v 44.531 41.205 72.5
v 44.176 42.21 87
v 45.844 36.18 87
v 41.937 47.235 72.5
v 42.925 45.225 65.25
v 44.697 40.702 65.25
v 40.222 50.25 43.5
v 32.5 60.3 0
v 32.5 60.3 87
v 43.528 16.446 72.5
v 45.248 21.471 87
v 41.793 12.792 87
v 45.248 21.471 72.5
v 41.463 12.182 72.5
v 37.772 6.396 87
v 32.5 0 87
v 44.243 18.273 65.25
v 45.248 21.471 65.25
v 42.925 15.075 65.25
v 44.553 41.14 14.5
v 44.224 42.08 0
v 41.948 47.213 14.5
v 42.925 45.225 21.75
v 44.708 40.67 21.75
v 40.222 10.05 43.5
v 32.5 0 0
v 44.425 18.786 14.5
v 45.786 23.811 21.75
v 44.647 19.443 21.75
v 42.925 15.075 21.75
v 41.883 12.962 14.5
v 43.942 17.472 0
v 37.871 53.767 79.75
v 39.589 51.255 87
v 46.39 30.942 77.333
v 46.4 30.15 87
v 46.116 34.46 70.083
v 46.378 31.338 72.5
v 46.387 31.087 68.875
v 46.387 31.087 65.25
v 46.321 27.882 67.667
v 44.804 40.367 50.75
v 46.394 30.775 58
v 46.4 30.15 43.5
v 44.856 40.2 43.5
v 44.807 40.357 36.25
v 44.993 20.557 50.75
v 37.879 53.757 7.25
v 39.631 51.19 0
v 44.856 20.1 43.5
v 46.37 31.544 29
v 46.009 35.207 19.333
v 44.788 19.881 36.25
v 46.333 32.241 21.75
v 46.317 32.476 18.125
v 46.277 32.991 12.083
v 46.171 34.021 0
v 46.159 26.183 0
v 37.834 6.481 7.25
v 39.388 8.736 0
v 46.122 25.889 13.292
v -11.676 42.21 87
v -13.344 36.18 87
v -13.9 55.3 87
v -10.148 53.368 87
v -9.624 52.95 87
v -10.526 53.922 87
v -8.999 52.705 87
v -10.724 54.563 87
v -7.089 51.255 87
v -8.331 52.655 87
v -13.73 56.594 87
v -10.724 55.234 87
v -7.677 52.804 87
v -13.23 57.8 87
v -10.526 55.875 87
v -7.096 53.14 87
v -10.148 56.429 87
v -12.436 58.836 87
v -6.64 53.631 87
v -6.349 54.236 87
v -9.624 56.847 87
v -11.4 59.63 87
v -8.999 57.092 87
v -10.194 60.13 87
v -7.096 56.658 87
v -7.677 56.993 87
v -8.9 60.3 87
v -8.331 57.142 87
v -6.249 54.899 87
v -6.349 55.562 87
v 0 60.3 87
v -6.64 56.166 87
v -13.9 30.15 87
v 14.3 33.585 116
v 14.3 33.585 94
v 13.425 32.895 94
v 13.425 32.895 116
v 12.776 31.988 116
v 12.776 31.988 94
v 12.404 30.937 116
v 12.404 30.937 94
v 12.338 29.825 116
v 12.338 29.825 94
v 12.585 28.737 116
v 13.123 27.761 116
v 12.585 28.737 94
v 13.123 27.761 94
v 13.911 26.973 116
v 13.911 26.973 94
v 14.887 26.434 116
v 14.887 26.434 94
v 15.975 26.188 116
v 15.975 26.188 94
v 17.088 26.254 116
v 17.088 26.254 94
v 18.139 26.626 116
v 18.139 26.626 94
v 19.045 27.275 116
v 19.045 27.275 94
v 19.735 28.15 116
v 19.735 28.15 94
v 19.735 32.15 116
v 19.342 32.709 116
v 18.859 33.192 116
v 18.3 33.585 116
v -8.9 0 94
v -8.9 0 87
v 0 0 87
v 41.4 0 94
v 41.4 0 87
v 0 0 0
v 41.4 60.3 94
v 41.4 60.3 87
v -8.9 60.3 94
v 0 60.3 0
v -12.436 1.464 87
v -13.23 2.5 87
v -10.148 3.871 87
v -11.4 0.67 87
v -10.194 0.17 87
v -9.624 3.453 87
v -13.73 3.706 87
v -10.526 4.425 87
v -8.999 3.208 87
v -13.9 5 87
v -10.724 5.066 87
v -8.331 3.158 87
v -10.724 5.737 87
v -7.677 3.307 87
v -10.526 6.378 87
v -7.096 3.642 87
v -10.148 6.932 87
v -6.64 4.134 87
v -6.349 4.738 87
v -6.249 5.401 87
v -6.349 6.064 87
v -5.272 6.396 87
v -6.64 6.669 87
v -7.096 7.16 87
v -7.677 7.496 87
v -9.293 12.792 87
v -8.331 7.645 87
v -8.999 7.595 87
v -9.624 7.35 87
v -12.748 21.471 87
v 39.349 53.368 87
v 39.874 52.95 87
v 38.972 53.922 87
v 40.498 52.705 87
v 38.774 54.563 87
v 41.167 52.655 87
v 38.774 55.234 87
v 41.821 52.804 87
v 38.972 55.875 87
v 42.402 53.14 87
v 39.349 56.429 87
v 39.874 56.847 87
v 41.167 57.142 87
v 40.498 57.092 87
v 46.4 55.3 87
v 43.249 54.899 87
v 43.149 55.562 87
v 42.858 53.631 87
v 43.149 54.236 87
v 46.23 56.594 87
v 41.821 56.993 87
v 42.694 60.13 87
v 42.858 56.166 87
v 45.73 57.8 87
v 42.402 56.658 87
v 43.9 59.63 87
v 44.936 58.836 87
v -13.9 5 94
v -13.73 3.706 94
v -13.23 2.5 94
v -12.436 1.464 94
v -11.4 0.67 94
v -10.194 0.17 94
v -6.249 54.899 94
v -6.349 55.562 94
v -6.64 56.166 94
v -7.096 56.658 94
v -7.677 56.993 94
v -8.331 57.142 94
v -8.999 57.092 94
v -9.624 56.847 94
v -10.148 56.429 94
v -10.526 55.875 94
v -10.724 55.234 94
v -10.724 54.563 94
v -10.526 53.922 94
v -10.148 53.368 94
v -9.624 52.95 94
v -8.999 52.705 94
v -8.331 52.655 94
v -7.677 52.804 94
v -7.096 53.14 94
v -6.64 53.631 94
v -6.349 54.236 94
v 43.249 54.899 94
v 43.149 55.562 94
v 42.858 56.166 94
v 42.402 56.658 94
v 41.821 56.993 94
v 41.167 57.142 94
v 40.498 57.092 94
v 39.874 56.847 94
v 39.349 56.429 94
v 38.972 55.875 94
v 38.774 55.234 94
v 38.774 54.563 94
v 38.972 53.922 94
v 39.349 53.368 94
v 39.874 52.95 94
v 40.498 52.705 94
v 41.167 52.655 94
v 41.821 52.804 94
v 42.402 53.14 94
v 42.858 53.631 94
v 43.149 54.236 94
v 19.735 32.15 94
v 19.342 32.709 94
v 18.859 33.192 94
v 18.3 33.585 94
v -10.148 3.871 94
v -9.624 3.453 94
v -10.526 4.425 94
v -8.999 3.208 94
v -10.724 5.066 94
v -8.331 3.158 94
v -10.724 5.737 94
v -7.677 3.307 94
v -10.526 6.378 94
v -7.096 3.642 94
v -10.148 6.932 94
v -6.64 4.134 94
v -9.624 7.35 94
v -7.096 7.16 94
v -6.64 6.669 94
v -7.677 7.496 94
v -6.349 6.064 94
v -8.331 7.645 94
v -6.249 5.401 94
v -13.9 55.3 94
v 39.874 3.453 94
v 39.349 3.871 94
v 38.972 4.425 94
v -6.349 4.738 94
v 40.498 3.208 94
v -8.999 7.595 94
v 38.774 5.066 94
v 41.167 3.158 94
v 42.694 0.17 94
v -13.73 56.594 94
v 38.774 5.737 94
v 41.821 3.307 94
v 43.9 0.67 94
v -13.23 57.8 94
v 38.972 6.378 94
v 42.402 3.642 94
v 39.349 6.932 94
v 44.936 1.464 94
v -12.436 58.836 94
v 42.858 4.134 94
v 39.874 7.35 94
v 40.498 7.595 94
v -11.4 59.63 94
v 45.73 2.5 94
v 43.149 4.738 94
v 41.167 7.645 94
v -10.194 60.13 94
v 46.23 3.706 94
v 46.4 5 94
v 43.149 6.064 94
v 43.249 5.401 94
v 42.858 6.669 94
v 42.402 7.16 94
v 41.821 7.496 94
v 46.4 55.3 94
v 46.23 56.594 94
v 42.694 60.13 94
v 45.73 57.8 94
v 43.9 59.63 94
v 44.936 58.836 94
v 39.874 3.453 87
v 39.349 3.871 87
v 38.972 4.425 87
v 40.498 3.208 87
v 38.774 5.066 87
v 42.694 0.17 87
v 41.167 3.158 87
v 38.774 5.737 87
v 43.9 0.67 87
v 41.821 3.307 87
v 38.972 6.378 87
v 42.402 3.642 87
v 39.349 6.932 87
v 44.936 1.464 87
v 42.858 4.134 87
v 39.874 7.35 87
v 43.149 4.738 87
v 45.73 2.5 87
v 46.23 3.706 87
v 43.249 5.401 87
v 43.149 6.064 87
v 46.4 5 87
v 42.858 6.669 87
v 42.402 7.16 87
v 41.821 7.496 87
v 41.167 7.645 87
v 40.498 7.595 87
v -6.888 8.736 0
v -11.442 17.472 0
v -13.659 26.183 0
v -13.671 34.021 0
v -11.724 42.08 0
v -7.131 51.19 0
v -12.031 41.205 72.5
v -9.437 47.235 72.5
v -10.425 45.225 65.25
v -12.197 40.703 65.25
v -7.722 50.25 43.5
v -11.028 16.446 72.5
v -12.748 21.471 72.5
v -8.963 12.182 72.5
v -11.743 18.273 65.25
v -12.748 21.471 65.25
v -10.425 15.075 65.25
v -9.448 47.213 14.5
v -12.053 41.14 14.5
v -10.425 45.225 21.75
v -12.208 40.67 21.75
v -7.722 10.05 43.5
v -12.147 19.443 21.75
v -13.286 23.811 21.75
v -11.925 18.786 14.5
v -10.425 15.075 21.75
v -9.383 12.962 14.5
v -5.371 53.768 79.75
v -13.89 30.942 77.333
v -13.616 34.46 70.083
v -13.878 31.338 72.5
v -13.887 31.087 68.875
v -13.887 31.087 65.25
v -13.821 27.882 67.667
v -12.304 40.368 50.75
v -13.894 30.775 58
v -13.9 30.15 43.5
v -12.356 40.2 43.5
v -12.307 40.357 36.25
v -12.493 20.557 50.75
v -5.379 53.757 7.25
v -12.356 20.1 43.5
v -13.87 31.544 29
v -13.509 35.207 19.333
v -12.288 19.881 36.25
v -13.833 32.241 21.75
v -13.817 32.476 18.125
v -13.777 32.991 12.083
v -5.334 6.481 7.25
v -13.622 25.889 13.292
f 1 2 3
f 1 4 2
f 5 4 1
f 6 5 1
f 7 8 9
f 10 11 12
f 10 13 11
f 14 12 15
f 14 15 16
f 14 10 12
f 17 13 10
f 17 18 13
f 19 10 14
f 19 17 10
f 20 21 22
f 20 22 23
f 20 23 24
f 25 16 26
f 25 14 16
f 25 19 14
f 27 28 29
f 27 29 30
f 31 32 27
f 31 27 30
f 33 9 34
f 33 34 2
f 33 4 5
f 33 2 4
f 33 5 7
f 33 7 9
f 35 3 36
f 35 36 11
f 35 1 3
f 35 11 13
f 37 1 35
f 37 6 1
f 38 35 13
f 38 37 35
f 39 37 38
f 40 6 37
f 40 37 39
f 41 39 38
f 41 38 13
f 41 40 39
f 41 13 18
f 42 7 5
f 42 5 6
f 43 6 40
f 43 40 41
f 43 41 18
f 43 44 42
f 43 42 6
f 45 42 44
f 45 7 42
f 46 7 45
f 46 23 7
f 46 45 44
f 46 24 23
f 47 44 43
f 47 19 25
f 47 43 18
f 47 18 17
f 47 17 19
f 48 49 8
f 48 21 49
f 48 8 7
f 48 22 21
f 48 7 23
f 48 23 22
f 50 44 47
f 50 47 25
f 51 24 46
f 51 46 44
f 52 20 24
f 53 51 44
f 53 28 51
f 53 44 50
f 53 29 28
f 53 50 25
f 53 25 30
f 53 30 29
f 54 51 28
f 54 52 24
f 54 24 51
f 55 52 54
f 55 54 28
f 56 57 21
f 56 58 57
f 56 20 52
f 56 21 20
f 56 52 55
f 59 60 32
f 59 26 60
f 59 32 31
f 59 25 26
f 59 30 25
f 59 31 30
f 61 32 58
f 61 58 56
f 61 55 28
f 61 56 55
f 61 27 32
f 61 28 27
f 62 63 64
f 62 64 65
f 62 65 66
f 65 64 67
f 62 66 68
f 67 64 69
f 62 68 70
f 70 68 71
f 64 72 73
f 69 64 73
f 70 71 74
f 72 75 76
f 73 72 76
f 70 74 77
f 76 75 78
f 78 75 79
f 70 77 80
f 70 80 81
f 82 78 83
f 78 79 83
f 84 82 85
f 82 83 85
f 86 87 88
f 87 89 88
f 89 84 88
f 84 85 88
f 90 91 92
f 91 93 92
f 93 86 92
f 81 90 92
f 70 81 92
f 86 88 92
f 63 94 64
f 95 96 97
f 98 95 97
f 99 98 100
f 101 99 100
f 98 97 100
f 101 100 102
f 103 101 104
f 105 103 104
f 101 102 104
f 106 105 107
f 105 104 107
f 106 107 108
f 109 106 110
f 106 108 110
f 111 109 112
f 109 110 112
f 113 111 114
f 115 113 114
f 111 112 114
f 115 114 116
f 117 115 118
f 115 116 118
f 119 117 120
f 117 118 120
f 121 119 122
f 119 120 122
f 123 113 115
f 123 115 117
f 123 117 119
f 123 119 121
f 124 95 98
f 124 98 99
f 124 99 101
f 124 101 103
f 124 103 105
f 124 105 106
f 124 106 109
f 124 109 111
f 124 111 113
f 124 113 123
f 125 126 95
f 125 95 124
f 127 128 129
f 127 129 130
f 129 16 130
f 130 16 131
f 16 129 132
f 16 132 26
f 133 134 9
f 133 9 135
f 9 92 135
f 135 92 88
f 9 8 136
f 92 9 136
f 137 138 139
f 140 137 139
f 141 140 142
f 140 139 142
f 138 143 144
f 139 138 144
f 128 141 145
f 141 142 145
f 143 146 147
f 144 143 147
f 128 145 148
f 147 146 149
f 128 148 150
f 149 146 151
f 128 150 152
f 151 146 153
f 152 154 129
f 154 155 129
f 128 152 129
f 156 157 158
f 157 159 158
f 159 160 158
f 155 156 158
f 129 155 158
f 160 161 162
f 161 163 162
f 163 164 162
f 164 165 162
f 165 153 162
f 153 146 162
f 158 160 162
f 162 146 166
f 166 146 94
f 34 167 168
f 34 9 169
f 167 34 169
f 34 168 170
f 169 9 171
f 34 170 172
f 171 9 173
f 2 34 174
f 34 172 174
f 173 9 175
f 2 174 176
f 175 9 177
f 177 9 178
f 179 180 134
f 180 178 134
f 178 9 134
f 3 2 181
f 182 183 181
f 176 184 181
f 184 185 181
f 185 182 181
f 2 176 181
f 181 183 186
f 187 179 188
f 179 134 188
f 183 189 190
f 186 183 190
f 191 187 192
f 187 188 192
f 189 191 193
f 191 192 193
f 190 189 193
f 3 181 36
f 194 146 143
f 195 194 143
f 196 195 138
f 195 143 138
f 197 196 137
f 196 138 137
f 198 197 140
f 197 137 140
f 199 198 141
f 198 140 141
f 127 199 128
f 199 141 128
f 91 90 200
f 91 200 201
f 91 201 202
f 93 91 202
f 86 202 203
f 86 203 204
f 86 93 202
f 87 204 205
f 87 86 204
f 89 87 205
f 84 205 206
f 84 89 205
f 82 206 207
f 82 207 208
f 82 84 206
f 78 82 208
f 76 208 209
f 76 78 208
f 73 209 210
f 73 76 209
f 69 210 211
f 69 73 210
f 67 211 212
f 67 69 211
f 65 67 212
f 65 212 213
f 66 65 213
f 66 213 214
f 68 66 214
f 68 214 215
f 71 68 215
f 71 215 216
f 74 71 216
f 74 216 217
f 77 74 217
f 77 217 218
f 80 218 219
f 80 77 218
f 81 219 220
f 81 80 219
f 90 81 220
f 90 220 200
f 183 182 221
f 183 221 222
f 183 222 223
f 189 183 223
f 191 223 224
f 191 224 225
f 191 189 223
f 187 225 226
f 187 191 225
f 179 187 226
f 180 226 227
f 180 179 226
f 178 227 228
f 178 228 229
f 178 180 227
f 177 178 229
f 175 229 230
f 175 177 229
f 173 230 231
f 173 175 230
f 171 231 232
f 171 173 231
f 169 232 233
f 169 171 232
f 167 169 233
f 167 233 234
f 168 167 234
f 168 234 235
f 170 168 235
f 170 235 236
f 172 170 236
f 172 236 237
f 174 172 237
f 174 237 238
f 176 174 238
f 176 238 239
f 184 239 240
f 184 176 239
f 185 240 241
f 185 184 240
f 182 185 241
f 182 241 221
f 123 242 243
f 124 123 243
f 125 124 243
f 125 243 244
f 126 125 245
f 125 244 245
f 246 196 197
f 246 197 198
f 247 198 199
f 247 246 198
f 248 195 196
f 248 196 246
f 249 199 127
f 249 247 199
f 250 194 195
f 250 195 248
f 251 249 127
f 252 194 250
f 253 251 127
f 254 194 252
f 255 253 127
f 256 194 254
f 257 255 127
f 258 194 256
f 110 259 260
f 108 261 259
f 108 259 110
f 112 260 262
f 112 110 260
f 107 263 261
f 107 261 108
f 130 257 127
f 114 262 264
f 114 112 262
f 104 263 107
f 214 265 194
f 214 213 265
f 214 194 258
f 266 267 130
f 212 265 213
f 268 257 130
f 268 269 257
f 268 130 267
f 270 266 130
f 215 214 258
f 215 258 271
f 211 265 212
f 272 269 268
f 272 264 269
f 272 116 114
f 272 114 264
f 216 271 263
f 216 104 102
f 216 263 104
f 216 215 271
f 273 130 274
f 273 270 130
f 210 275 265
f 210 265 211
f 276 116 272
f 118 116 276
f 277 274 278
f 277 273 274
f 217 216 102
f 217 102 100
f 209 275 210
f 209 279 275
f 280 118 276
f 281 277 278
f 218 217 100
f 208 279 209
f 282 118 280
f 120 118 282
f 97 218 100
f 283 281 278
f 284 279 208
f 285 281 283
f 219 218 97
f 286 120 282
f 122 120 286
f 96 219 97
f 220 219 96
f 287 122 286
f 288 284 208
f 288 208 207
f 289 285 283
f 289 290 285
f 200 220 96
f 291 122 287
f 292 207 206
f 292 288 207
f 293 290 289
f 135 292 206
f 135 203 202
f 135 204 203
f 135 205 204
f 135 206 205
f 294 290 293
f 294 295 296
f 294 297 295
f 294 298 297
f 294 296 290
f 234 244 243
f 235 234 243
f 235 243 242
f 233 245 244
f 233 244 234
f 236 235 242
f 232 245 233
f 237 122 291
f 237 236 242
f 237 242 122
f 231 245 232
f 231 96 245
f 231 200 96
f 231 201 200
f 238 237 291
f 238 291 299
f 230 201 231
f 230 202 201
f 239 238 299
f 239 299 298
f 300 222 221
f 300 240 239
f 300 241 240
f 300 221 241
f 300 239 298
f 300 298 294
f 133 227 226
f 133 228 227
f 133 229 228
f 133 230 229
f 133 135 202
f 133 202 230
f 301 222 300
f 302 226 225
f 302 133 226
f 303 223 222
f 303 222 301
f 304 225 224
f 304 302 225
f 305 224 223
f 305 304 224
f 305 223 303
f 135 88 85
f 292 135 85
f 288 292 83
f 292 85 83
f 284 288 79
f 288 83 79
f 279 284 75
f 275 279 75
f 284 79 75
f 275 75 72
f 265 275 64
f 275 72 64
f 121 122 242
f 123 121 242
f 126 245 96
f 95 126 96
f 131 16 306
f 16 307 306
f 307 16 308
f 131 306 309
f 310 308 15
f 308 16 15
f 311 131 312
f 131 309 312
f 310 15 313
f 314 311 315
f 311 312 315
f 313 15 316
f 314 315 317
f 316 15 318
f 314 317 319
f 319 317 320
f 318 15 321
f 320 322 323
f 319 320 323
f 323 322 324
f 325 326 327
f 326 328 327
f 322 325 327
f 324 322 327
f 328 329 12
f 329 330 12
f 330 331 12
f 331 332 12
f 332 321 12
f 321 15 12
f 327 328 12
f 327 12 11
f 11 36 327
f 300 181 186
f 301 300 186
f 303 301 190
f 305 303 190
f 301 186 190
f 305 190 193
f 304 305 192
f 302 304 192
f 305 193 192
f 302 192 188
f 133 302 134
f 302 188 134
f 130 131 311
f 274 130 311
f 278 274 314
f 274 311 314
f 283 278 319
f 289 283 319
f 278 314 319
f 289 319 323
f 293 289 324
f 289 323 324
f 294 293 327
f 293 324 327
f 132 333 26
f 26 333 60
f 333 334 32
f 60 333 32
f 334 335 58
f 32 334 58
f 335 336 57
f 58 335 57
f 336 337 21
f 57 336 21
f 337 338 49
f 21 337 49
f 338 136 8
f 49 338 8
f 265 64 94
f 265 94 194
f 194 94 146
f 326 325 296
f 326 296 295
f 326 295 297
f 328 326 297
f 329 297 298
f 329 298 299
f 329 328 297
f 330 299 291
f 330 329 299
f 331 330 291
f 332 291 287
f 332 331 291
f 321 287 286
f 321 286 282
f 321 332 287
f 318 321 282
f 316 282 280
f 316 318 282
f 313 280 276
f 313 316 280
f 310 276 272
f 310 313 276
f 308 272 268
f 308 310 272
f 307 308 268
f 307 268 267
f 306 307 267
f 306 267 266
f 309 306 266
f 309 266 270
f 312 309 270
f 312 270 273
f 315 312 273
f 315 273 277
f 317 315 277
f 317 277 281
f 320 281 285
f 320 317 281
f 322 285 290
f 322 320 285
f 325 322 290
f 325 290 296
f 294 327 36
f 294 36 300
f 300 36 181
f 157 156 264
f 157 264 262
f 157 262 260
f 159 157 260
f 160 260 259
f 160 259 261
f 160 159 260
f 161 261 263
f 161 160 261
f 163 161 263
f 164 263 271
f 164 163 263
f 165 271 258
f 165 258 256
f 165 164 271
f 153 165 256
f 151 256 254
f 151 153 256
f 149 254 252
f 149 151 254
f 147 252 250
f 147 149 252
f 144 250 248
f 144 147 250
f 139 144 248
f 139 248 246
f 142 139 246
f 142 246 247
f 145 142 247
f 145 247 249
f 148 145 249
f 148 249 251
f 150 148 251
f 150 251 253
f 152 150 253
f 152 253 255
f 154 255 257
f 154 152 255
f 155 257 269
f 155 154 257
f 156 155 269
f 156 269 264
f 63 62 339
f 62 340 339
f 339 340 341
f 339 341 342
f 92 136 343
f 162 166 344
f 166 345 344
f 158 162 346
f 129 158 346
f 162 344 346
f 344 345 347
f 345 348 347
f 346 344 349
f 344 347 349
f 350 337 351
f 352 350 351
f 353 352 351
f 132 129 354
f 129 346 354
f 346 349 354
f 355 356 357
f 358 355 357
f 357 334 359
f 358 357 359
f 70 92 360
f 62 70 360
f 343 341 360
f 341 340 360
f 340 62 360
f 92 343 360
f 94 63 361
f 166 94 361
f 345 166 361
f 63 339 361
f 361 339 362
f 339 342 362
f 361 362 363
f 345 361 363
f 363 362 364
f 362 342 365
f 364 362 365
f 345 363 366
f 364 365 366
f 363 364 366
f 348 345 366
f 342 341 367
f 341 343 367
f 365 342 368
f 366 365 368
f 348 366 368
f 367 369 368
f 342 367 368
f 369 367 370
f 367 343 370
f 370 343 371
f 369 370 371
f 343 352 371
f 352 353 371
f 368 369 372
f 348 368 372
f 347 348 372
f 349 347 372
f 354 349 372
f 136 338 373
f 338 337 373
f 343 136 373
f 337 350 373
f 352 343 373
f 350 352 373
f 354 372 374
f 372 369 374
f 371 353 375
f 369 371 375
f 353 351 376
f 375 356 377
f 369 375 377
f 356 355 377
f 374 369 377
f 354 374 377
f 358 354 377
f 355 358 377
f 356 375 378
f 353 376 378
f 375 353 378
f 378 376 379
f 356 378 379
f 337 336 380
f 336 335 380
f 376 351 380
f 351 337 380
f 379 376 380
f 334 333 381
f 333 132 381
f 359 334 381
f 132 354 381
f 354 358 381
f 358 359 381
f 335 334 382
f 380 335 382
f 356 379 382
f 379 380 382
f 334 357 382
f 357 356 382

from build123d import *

# Parameters (mm, degrees)
BOSS_EXTRUDE1_DEPTH = 87
SKETCH2_R           = 2.25
BOSS_EXTRUDE2_DEPTH = 7
BOSS_EXTRUDE3_DEPTH = 22


with BuildPart() as part:
    # Sketch1 → Boss-Extrude1 (new body)
    with BuildSketch(Plane.XY):
        with BuildLine():
            Line((0, 0), (32.5, 0))
            add(Edge.make_bspline(
                [(32.5, 60.3), (60.3, 30.15), (32.5, 0)],
                knots=[0, 0, 0, 1, 1, 1], degree=2))
            Line((32.5, 60.3), (0, 60.3))
            add(Edge.make_bspline(
                [(0, 60.3), (-27.8, 30.15), (0, 0)],
                knots=[0, 0, 0, 1, 1, 1], degree=2))
        make_face()
    extrude(amount=BOSS_EXTRUDE1_DEPTH)

    # Sketch2 → Boss-Extrude2 (add)
    with BuildSketch(Plane.XY.offset(87)):
        with BuildLine():
            Line((-13.9, 55.3), (-13.9, 5))
            ThreePointArc((-13.9, 5), (-12.435533906, 1.464466094), (-8.9, 0))
            Line((-8.9, 0), (41.4, 0))
            ThreePointArc((41.4, 0), (44.935533906, 1.464466094), (46.4, 5))
            Line((46.4, 5), (46.4, 55.3))
            ThreePointArc((46.4, 55.3), (44.935533906, 58.835533906), (41.4, 60.3))
            Line((41.4, 60.3), (-8.9, 60.3))
            ThreePointArc((-8.9, 60.3), (-12.435533906, 58.835533906), (-13.9, 55.3))
        make_face()
        with Locations((40.998737342, 54.898737342)):
            Circle(SKETCH2_R, mode=Mode.SUBTRACT)
        with Locations((40.998737342, 5.401262658)):
            Circle(SKETCH2_R, mode=Mode.SUBTRACT)
        with Locations((-8.498737342, 5.401262658)):
            Circle(SKETCH2_R, mode=Mode.SUBTRACT)
        with Locations((-8.498737342, 54.898737342)):
            Circle(SKETCH2_R, mode=Mode.SUBTRACT)
    extrude(amount=BOSS_EXTRUDE2_DEPTH)

    # Sketch3 → Boss-Extrude3 (add)
    with BuildSketch(Plane.XY.offset(94)):
        with BuildLine():
            Line((18.300133509, 33.585203779), (14.300133509, 33.585203779))
            ThreePointArc((14.300133509, 33.585203779), (13.489384054, 27.339250545), (19.735337287, 28.15))
            Line((19.735337287, 28.15), (19.735337287, 32.15))
            ThreePointArc((19.735337287, 32.15), (19.110882964, 32.960749455), (18.300133509, 33.585203779))
        make_face()
    extrude(amount=BOSS_EXTRUDE3_DEPTH)


solid = part.part
